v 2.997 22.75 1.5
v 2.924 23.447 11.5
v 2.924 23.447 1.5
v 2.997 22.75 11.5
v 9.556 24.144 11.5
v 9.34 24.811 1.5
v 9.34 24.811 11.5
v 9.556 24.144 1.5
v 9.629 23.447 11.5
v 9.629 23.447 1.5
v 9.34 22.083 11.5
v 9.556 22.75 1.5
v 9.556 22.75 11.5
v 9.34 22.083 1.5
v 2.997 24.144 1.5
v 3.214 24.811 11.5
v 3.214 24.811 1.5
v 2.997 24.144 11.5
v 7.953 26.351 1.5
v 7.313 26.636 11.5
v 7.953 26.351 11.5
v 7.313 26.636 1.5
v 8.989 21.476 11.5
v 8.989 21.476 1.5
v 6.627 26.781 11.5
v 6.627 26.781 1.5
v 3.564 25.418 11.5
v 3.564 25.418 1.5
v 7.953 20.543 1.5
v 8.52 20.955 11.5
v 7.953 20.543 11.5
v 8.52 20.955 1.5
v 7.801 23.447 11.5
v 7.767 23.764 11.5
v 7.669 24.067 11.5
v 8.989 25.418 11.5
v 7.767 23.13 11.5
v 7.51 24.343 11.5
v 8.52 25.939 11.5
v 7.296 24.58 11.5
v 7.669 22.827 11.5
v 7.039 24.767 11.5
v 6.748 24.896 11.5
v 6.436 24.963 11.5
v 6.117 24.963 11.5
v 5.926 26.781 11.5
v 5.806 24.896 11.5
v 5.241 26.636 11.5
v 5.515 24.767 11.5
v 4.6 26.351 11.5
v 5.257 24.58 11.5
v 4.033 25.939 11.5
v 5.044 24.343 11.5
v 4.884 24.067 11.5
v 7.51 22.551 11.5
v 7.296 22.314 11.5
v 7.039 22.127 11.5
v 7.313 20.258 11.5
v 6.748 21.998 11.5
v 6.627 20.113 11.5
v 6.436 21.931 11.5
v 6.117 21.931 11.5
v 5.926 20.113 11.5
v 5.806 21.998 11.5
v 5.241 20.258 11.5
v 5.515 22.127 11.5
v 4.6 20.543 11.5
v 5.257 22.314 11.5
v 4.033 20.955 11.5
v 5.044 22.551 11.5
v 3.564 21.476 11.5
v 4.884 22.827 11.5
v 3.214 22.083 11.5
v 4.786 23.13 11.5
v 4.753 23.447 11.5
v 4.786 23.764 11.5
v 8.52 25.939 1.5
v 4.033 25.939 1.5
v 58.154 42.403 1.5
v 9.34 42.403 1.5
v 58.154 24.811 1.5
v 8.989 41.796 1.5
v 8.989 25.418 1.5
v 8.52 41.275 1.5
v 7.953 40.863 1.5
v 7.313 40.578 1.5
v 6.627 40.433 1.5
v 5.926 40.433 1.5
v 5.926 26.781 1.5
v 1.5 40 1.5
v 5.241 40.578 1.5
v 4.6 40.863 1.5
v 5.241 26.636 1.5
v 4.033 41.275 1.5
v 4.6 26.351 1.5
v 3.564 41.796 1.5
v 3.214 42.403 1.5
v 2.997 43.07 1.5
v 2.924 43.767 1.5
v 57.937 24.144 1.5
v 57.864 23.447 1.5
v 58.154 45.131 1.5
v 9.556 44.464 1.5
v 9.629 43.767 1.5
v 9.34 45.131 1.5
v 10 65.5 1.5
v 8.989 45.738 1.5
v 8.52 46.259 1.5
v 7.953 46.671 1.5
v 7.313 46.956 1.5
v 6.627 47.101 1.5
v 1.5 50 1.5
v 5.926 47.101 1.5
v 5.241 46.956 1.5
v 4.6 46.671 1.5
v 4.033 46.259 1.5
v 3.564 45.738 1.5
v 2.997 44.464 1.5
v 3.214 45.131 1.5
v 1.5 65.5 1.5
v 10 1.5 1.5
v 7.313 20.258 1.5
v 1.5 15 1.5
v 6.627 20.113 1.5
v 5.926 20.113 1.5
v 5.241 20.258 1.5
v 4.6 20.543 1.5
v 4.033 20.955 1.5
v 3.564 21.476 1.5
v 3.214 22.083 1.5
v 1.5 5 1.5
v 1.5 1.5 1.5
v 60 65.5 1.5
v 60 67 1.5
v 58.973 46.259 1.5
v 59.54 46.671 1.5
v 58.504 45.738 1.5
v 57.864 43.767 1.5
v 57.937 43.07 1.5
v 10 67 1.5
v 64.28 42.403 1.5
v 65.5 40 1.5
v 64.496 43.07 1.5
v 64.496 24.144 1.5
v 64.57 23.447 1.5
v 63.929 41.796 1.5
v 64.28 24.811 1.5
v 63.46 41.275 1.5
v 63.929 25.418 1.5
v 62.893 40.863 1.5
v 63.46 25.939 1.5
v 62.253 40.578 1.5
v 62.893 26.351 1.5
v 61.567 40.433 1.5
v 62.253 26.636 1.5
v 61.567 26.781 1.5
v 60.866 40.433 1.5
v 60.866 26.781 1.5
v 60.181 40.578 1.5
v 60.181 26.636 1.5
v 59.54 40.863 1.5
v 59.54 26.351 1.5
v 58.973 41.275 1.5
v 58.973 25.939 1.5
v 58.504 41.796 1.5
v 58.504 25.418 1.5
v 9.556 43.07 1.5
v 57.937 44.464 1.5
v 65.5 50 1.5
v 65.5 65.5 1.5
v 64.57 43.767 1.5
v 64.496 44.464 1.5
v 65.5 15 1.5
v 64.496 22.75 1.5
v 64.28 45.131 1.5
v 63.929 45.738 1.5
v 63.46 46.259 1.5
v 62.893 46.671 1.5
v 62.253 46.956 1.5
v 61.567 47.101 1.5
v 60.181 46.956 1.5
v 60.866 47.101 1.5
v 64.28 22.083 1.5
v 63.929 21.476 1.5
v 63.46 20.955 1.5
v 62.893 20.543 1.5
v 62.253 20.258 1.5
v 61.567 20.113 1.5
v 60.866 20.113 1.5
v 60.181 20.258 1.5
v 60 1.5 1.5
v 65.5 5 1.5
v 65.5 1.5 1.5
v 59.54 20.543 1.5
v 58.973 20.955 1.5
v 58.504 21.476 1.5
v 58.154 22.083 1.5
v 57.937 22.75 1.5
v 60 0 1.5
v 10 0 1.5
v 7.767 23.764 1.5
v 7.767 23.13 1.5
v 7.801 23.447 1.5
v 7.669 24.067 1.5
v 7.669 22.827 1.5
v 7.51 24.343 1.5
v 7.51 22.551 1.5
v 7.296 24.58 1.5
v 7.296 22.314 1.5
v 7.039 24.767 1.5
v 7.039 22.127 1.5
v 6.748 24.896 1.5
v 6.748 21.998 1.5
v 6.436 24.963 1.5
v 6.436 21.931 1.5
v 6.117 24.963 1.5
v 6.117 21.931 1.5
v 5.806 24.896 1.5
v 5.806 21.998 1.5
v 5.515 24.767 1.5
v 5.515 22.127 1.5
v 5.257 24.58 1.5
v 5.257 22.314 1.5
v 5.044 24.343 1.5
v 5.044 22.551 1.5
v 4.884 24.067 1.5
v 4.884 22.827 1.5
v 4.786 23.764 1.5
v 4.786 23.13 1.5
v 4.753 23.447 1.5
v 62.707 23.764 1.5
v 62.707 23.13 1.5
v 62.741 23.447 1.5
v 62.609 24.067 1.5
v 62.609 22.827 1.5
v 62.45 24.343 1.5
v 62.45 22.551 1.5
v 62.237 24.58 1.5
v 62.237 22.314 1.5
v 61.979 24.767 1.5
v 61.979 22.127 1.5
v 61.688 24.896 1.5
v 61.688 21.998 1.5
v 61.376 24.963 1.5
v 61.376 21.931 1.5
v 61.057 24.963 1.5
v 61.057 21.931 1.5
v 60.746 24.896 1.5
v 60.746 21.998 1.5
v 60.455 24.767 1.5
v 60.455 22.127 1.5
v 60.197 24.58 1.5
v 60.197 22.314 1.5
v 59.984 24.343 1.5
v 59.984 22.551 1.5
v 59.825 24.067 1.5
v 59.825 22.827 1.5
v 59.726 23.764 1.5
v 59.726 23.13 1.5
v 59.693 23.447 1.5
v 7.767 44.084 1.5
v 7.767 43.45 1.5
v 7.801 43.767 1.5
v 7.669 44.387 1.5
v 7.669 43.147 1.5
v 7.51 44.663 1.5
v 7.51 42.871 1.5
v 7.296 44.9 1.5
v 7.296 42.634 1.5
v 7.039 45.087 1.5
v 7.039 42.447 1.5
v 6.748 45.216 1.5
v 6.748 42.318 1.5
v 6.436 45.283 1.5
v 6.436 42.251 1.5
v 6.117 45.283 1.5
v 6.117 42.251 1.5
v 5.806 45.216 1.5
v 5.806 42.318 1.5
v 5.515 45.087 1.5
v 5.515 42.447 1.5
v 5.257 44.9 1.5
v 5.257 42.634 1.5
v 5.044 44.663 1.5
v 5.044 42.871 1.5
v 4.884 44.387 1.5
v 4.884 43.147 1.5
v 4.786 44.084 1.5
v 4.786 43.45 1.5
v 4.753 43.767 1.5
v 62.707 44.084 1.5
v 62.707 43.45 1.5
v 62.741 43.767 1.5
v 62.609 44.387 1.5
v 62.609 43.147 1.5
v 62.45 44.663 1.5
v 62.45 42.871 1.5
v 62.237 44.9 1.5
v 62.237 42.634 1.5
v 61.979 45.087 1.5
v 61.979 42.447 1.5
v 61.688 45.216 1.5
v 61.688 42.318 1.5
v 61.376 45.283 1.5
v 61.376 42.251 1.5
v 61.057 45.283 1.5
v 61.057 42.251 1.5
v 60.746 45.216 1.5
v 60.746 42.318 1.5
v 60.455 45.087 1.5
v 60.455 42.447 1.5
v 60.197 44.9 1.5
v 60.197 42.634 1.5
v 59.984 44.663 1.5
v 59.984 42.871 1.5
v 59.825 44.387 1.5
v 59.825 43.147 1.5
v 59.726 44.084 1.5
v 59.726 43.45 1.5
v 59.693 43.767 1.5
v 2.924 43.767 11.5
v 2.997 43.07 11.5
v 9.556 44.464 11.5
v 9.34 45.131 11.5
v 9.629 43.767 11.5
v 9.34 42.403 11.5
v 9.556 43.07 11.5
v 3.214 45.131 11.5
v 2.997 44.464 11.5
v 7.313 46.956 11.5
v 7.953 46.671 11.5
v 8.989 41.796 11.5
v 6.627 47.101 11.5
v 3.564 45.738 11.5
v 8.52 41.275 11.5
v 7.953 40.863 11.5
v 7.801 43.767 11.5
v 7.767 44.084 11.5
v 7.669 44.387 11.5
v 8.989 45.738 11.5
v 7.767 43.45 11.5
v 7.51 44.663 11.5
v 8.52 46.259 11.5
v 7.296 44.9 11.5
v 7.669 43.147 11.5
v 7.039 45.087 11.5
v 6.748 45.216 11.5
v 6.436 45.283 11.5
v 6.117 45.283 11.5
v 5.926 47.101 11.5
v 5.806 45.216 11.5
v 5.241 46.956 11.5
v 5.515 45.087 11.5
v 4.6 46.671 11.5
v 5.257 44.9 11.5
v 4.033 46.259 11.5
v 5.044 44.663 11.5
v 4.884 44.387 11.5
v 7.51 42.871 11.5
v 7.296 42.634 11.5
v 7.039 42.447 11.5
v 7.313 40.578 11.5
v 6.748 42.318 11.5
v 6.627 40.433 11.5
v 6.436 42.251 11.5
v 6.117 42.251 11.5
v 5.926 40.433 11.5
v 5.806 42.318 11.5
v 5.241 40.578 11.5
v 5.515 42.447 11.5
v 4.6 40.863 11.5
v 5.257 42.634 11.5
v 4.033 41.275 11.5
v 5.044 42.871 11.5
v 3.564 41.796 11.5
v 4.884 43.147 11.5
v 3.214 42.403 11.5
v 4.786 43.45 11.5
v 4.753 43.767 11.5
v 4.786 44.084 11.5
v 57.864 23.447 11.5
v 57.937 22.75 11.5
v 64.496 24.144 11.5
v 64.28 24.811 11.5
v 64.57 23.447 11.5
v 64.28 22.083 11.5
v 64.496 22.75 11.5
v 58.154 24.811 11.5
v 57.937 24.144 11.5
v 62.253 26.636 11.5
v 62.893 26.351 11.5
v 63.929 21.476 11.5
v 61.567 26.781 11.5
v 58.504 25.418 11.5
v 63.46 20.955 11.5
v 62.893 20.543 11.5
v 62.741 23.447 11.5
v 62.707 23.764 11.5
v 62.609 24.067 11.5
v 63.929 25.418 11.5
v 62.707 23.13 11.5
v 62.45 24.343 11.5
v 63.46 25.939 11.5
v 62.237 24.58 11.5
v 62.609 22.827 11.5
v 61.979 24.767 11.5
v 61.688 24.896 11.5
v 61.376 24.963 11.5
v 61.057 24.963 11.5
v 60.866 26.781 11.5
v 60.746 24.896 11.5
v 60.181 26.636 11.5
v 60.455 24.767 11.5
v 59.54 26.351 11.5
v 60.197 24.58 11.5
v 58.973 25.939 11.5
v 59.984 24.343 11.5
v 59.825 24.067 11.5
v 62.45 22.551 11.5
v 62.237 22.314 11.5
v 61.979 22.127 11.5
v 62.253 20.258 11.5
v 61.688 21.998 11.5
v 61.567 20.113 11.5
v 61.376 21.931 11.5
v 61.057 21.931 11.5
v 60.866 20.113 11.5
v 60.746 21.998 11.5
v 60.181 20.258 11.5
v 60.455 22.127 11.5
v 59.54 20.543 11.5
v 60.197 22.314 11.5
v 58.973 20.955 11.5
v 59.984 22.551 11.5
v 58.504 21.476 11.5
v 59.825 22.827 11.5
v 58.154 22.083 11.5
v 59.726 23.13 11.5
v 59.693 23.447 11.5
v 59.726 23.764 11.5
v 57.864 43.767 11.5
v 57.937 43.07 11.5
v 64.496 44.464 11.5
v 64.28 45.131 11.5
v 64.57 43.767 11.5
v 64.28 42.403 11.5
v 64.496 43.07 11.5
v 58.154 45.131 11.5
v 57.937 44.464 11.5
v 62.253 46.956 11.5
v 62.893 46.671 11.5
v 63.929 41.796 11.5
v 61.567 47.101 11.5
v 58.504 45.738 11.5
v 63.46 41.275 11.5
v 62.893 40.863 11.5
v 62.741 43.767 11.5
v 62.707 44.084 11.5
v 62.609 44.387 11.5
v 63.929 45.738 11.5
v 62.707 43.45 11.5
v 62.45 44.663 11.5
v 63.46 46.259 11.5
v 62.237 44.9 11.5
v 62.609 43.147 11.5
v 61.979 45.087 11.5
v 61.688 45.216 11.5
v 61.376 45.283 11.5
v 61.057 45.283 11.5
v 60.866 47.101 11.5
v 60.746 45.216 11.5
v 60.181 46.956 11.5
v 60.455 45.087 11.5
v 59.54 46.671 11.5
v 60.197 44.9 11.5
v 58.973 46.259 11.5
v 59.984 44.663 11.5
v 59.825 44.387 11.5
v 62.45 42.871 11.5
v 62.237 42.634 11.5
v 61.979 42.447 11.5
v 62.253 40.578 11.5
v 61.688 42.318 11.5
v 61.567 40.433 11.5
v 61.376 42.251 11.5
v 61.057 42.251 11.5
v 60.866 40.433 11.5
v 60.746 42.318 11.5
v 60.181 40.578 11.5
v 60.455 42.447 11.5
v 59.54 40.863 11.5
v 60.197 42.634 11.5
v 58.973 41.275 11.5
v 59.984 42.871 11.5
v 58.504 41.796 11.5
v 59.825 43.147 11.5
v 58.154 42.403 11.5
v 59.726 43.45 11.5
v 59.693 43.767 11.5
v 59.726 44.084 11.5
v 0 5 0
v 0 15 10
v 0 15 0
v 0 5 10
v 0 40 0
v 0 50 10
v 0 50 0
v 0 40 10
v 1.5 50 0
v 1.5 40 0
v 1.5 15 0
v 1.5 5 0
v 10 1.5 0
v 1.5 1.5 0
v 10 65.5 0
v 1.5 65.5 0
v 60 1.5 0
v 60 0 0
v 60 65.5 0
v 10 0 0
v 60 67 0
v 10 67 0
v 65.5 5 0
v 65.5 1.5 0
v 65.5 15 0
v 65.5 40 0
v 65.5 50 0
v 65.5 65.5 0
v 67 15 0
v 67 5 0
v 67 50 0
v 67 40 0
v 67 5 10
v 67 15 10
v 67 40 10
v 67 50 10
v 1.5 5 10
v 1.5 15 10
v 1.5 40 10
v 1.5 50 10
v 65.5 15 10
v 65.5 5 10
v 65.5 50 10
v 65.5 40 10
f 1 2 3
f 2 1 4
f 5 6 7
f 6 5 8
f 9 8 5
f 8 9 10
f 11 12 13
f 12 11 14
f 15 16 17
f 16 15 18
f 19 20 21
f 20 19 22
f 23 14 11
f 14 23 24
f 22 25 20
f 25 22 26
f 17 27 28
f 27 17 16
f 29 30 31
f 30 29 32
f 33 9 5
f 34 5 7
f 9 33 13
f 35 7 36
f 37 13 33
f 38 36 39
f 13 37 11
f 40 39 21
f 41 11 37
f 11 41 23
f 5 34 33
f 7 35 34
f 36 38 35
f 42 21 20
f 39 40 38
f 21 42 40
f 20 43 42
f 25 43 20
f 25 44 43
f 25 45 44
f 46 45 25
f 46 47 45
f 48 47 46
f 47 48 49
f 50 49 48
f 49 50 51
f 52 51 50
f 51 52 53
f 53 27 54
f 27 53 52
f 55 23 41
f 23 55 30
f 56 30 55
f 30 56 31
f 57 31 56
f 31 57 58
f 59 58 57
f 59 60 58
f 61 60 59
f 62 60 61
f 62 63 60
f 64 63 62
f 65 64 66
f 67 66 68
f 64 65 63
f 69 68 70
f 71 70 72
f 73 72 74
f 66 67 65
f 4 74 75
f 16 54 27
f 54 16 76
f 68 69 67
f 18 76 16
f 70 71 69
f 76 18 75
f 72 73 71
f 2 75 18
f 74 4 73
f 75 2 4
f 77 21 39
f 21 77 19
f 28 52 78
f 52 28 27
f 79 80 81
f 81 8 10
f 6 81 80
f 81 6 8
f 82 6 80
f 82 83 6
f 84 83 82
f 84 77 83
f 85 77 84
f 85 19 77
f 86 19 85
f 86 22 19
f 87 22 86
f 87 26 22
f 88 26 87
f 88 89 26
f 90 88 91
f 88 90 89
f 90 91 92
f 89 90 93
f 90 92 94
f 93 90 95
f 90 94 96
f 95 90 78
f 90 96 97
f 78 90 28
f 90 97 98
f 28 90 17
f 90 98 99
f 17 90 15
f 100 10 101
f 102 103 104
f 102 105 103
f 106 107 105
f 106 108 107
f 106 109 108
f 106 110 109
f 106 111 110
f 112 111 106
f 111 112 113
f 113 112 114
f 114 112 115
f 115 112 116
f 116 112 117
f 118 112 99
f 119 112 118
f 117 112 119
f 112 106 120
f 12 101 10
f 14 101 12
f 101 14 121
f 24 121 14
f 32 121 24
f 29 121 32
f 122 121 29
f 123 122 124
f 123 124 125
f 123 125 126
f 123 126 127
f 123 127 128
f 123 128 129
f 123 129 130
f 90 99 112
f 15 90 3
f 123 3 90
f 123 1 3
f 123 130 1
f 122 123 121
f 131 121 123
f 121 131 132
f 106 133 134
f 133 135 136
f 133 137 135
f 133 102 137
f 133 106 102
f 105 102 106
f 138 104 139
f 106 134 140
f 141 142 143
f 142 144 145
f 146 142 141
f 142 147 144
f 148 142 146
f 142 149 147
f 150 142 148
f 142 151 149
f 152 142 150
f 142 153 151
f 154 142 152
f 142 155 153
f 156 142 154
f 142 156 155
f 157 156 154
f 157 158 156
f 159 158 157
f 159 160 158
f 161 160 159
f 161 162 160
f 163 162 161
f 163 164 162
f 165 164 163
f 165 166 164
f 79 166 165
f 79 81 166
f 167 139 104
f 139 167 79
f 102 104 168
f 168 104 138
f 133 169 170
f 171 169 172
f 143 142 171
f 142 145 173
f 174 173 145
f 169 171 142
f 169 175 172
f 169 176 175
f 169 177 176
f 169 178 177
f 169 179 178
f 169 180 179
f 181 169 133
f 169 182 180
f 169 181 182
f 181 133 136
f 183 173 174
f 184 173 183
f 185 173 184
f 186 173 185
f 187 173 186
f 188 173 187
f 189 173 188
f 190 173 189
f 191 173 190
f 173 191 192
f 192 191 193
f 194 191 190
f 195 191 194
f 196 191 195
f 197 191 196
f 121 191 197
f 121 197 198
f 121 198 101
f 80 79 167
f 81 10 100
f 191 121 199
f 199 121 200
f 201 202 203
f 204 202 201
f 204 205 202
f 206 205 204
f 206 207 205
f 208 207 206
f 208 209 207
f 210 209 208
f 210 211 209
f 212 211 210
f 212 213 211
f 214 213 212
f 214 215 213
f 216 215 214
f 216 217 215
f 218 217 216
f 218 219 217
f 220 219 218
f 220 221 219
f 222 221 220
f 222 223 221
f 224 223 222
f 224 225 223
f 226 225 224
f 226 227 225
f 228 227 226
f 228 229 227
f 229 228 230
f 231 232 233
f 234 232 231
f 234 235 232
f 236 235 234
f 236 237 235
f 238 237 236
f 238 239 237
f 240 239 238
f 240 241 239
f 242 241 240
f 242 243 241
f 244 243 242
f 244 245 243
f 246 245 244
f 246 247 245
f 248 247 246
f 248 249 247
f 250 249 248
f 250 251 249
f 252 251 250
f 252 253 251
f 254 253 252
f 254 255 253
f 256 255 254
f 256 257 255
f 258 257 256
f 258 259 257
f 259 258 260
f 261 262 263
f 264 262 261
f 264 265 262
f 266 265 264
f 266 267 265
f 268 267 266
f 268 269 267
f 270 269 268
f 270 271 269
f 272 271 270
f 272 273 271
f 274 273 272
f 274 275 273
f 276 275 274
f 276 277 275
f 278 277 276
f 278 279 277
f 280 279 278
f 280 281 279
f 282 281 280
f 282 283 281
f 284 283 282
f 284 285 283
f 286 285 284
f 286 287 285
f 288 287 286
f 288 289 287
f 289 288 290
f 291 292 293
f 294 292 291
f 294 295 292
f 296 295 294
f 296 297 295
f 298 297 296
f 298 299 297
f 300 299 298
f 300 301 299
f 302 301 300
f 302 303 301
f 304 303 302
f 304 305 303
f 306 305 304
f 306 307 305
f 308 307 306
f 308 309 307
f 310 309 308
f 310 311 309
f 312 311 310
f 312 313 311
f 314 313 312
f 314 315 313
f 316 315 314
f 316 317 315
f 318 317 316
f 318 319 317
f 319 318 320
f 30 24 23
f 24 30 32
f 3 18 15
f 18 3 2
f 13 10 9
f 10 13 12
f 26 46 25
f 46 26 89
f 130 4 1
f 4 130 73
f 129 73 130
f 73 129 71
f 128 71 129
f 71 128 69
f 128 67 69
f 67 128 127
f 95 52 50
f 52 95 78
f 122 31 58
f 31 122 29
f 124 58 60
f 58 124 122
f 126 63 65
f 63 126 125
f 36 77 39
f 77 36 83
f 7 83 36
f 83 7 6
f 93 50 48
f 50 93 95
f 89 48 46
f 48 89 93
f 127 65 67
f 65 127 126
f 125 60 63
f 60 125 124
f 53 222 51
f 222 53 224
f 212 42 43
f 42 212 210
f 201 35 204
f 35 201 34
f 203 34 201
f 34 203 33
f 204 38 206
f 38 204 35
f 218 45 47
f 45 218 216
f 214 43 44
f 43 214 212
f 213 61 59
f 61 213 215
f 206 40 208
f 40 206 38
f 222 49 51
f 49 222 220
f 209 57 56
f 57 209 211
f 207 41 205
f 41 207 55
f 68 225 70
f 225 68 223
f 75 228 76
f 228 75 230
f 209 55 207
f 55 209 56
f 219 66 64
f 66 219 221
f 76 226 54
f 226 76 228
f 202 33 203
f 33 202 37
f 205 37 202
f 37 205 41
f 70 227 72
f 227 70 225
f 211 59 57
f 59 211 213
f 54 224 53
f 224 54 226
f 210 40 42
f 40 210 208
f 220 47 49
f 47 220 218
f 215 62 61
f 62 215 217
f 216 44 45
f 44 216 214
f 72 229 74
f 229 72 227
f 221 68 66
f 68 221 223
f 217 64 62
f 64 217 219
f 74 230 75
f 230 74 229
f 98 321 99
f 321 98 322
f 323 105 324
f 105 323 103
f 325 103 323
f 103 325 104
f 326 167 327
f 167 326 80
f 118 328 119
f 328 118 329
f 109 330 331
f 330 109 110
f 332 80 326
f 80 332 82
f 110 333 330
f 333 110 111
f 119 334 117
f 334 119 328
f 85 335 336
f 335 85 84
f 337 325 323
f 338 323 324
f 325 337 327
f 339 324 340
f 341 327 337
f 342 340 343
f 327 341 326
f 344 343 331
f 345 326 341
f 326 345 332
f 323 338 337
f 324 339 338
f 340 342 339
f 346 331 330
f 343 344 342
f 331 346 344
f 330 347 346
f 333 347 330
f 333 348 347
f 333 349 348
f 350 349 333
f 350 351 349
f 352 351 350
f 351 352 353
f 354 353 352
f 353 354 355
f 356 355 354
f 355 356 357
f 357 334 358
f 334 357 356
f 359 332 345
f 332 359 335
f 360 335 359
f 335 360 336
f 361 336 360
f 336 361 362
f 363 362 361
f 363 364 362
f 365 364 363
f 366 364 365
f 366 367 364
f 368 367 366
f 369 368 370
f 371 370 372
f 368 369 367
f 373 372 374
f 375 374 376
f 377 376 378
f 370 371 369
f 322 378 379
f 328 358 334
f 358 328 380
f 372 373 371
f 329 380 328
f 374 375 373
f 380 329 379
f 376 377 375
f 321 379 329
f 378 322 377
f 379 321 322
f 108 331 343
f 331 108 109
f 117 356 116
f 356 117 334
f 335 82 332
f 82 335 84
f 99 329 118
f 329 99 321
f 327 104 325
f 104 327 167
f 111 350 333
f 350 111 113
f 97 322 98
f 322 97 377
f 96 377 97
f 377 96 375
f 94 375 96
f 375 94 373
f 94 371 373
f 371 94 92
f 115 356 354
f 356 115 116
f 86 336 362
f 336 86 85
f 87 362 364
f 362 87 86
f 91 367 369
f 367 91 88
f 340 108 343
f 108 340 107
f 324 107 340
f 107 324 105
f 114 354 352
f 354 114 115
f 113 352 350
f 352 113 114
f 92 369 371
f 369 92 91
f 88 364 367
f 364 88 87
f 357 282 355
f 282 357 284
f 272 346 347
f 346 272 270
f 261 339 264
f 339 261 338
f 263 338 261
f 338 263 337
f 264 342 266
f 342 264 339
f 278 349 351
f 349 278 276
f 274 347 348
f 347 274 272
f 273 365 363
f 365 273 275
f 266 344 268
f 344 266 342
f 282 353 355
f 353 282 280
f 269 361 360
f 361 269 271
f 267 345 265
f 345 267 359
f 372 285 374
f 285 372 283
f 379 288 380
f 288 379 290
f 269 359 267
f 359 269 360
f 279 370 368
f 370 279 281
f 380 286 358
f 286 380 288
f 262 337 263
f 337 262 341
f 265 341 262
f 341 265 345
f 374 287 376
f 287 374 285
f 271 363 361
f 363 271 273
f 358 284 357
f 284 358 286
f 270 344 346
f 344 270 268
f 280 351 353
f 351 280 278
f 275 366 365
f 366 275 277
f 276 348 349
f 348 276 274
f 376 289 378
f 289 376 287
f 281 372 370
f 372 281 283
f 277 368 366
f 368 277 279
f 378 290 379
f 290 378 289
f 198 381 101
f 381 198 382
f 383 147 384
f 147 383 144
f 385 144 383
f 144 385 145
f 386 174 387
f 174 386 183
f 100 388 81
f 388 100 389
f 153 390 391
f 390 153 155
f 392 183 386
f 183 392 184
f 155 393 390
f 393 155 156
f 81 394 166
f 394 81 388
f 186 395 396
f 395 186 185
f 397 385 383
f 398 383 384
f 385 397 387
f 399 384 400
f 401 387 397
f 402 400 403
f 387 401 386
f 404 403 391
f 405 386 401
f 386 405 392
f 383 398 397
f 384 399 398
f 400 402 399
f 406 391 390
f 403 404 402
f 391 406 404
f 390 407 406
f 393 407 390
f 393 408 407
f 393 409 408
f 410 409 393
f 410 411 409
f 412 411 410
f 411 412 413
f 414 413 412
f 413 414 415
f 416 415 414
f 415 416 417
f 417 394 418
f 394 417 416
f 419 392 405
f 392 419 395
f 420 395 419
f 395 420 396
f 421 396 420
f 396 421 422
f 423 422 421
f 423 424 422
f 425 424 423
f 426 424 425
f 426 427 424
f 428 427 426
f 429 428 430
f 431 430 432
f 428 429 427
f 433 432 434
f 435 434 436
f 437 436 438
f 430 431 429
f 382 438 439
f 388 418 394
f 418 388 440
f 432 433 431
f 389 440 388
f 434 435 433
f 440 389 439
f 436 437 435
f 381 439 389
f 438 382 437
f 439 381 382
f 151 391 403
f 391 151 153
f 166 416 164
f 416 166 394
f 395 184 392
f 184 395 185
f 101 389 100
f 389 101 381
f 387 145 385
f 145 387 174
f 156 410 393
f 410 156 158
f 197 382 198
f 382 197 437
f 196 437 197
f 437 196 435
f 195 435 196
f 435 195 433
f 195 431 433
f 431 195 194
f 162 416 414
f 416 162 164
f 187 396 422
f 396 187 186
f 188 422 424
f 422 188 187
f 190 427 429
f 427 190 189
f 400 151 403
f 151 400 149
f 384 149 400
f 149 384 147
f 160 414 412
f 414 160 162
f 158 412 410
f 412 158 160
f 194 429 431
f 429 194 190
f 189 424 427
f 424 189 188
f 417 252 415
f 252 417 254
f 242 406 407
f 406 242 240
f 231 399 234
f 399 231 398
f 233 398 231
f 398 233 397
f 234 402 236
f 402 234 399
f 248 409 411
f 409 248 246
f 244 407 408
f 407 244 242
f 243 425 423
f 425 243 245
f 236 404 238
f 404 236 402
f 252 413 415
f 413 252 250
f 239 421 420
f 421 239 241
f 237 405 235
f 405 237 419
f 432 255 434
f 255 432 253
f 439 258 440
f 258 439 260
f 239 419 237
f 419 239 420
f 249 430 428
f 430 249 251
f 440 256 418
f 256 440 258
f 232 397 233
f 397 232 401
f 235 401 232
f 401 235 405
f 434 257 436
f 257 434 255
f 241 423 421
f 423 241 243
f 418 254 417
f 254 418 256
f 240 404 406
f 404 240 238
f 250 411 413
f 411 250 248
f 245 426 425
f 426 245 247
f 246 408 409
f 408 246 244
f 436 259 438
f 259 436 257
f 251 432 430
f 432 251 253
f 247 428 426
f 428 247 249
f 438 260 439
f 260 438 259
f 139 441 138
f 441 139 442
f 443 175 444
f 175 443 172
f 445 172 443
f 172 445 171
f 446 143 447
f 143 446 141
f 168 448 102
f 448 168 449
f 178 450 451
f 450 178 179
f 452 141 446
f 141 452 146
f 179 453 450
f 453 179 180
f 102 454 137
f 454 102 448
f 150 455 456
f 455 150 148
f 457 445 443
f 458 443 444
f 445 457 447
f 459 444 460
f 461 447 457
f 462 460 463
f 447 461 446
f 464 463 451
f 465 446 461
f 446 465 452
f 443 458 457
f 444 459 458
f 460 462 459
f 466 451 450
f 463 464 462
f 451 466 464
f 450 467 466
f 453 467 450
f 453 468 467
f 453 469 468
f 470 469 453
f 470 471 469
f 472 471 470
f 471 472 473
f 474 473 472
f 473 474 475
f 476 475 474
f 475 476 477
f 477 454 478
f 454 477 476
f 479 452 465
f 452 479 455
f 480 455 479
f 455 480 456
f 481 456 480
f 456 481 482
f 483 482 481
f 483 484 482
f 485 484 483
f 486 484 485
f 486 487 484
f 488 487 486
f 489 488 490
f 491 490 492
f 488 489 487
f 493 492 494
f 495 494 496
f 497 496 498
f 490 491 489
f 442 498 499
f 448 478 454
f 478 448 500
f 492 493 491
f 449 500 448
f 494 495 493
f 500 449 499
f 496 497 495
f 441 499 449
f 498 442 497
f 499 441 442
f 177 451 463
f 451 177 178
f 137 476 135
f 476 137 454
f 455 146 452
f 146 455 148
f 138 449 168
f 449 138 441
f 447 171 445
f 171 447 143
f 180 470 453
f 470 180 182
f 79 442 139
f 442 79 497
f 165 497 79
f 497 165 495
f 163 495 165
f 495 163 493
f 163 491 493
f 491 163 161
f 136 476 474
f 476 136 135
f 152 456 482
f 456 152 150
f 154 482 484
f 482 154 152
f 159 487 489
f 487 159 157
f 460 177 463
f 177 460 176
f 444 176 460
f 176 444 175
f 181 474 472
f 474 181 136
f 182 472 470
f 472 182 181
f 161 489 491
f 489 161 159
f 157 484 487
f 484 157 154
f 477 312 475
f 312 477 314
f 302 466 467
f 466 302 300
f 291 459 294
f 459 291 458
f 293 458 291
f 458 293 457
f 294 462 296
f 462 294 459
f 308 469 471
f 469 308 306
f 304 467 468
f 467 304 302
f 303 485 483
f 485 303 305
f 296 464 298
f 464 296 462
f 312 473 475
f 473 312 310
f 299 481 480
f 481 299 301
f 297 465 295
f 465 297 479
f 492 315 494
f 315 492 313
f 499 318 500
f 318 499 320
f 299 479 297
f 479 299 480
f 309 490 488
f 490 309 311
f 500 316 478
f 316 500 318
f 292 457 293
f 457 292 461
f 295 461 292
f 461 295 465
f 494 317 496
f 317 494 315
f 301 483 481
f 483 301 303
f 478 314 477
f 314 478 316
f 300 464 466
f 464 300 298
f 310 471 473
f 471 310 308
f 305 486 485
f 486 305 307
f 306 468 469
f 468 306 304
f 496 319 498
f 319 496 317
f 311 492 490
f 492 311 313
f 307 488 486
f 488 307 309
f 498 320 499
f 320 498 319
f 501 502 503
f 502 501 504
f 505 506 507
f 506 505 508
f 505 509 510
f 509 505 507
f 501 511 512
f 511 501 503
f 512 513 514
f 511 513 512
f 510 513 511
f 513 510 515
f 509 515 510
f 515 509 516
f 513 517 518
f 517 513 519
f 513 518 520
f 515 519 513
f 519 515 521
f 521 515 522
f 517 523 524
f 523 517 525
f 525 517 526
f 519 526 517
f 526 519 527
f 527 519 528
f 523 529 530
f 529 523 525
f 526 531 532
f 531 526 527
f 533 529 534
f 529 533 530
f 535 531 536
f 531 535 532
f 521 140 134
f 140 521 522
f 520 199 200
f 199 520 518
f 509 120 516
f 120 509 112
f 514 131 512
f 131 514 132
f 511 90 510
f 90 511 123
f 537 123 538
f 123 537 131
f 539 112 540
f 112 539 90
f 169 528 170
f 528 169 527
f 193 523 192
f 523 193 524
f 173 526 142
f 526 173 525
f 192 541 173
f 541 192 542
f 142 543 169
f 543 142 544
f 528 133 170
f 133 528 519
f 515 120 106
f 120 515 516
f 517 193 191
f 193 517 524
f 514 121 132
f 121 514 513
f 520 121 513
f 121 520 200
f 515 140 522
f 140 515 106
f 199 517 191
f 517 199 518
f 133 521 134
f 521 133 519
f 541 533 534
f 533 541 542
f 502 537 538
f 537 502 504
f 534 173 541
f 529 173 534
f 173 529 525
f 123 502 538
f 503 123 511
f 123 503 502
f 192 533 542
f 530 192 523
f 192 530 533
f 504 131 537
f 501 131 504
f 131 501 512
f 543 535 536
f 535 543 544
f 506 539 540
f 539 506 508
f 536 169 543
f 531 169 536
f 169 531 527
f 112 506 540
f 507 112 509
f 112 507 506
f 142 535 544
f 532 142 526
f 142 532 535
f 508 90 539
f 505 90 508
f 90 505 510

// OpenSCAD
$fn = 30;
thou2mm = 0.0254;

translate([1.5+1.5,1.5+1.5,1.5]){
translate([129*thou2mm,805*thou2mm]) {
    difference(){
    scale([thou2mm,thou2mm,1])cylinder(h=10, r1=132, r2=132);
    scale([thou2mm,thou2mm,1])cylinder(h=17, r1=60, r2=60); 

    } 
}
translate([129*thou2mm,1605*thou2mm]){
    difference(){
    scale([thou2mm,thou2mm,1])cylinder(h=10, r1=132, r2=132);
    scale([thou2mm,thou2mm,1])cylinder(h=17, r1=60, r2=60); 

    }  
}
translate([2292*thou2mm,805*thou2mm]){ 
    difference(){
    scale([thou2mm,thou2mm,1])cylinder(h=10, r1=132, r2=132);
    scale([thou2mm,thou2mm,1])cylinder(h=17, r1=60, r2=60); 

    }
}
translate([2292*thou2mm,1605*thou2mm]){ 
    difference(){
    scale([thou2mm,thou2mm,1])cylinder(h=10, r1=132, r2=132);  
    scale([thou2mm,thou2mm,1])cylinder(h=17, r1=60, r2=60); }
    }
}

translate([67,0,25]){
rotate([0,180,0]){
translate([0,0,0]){
    difference(){
        cube([67,67,25]);
        translate([1.5,-1,0]){
            cube([64,70,23.5]);}
    difference(){
        cube([67,67,25]);
        translate([1.5,1.5,1.5]){
            cube([64,64,23.5]);}
        translate([7,0,5]){
            cube([50,70,20]);}
        translate([0,5,15]){
            cube([70,10,10]);}
        translate([0,40,15]){
            cube([70,10,10]);}
    }
    

}
}
}
}
